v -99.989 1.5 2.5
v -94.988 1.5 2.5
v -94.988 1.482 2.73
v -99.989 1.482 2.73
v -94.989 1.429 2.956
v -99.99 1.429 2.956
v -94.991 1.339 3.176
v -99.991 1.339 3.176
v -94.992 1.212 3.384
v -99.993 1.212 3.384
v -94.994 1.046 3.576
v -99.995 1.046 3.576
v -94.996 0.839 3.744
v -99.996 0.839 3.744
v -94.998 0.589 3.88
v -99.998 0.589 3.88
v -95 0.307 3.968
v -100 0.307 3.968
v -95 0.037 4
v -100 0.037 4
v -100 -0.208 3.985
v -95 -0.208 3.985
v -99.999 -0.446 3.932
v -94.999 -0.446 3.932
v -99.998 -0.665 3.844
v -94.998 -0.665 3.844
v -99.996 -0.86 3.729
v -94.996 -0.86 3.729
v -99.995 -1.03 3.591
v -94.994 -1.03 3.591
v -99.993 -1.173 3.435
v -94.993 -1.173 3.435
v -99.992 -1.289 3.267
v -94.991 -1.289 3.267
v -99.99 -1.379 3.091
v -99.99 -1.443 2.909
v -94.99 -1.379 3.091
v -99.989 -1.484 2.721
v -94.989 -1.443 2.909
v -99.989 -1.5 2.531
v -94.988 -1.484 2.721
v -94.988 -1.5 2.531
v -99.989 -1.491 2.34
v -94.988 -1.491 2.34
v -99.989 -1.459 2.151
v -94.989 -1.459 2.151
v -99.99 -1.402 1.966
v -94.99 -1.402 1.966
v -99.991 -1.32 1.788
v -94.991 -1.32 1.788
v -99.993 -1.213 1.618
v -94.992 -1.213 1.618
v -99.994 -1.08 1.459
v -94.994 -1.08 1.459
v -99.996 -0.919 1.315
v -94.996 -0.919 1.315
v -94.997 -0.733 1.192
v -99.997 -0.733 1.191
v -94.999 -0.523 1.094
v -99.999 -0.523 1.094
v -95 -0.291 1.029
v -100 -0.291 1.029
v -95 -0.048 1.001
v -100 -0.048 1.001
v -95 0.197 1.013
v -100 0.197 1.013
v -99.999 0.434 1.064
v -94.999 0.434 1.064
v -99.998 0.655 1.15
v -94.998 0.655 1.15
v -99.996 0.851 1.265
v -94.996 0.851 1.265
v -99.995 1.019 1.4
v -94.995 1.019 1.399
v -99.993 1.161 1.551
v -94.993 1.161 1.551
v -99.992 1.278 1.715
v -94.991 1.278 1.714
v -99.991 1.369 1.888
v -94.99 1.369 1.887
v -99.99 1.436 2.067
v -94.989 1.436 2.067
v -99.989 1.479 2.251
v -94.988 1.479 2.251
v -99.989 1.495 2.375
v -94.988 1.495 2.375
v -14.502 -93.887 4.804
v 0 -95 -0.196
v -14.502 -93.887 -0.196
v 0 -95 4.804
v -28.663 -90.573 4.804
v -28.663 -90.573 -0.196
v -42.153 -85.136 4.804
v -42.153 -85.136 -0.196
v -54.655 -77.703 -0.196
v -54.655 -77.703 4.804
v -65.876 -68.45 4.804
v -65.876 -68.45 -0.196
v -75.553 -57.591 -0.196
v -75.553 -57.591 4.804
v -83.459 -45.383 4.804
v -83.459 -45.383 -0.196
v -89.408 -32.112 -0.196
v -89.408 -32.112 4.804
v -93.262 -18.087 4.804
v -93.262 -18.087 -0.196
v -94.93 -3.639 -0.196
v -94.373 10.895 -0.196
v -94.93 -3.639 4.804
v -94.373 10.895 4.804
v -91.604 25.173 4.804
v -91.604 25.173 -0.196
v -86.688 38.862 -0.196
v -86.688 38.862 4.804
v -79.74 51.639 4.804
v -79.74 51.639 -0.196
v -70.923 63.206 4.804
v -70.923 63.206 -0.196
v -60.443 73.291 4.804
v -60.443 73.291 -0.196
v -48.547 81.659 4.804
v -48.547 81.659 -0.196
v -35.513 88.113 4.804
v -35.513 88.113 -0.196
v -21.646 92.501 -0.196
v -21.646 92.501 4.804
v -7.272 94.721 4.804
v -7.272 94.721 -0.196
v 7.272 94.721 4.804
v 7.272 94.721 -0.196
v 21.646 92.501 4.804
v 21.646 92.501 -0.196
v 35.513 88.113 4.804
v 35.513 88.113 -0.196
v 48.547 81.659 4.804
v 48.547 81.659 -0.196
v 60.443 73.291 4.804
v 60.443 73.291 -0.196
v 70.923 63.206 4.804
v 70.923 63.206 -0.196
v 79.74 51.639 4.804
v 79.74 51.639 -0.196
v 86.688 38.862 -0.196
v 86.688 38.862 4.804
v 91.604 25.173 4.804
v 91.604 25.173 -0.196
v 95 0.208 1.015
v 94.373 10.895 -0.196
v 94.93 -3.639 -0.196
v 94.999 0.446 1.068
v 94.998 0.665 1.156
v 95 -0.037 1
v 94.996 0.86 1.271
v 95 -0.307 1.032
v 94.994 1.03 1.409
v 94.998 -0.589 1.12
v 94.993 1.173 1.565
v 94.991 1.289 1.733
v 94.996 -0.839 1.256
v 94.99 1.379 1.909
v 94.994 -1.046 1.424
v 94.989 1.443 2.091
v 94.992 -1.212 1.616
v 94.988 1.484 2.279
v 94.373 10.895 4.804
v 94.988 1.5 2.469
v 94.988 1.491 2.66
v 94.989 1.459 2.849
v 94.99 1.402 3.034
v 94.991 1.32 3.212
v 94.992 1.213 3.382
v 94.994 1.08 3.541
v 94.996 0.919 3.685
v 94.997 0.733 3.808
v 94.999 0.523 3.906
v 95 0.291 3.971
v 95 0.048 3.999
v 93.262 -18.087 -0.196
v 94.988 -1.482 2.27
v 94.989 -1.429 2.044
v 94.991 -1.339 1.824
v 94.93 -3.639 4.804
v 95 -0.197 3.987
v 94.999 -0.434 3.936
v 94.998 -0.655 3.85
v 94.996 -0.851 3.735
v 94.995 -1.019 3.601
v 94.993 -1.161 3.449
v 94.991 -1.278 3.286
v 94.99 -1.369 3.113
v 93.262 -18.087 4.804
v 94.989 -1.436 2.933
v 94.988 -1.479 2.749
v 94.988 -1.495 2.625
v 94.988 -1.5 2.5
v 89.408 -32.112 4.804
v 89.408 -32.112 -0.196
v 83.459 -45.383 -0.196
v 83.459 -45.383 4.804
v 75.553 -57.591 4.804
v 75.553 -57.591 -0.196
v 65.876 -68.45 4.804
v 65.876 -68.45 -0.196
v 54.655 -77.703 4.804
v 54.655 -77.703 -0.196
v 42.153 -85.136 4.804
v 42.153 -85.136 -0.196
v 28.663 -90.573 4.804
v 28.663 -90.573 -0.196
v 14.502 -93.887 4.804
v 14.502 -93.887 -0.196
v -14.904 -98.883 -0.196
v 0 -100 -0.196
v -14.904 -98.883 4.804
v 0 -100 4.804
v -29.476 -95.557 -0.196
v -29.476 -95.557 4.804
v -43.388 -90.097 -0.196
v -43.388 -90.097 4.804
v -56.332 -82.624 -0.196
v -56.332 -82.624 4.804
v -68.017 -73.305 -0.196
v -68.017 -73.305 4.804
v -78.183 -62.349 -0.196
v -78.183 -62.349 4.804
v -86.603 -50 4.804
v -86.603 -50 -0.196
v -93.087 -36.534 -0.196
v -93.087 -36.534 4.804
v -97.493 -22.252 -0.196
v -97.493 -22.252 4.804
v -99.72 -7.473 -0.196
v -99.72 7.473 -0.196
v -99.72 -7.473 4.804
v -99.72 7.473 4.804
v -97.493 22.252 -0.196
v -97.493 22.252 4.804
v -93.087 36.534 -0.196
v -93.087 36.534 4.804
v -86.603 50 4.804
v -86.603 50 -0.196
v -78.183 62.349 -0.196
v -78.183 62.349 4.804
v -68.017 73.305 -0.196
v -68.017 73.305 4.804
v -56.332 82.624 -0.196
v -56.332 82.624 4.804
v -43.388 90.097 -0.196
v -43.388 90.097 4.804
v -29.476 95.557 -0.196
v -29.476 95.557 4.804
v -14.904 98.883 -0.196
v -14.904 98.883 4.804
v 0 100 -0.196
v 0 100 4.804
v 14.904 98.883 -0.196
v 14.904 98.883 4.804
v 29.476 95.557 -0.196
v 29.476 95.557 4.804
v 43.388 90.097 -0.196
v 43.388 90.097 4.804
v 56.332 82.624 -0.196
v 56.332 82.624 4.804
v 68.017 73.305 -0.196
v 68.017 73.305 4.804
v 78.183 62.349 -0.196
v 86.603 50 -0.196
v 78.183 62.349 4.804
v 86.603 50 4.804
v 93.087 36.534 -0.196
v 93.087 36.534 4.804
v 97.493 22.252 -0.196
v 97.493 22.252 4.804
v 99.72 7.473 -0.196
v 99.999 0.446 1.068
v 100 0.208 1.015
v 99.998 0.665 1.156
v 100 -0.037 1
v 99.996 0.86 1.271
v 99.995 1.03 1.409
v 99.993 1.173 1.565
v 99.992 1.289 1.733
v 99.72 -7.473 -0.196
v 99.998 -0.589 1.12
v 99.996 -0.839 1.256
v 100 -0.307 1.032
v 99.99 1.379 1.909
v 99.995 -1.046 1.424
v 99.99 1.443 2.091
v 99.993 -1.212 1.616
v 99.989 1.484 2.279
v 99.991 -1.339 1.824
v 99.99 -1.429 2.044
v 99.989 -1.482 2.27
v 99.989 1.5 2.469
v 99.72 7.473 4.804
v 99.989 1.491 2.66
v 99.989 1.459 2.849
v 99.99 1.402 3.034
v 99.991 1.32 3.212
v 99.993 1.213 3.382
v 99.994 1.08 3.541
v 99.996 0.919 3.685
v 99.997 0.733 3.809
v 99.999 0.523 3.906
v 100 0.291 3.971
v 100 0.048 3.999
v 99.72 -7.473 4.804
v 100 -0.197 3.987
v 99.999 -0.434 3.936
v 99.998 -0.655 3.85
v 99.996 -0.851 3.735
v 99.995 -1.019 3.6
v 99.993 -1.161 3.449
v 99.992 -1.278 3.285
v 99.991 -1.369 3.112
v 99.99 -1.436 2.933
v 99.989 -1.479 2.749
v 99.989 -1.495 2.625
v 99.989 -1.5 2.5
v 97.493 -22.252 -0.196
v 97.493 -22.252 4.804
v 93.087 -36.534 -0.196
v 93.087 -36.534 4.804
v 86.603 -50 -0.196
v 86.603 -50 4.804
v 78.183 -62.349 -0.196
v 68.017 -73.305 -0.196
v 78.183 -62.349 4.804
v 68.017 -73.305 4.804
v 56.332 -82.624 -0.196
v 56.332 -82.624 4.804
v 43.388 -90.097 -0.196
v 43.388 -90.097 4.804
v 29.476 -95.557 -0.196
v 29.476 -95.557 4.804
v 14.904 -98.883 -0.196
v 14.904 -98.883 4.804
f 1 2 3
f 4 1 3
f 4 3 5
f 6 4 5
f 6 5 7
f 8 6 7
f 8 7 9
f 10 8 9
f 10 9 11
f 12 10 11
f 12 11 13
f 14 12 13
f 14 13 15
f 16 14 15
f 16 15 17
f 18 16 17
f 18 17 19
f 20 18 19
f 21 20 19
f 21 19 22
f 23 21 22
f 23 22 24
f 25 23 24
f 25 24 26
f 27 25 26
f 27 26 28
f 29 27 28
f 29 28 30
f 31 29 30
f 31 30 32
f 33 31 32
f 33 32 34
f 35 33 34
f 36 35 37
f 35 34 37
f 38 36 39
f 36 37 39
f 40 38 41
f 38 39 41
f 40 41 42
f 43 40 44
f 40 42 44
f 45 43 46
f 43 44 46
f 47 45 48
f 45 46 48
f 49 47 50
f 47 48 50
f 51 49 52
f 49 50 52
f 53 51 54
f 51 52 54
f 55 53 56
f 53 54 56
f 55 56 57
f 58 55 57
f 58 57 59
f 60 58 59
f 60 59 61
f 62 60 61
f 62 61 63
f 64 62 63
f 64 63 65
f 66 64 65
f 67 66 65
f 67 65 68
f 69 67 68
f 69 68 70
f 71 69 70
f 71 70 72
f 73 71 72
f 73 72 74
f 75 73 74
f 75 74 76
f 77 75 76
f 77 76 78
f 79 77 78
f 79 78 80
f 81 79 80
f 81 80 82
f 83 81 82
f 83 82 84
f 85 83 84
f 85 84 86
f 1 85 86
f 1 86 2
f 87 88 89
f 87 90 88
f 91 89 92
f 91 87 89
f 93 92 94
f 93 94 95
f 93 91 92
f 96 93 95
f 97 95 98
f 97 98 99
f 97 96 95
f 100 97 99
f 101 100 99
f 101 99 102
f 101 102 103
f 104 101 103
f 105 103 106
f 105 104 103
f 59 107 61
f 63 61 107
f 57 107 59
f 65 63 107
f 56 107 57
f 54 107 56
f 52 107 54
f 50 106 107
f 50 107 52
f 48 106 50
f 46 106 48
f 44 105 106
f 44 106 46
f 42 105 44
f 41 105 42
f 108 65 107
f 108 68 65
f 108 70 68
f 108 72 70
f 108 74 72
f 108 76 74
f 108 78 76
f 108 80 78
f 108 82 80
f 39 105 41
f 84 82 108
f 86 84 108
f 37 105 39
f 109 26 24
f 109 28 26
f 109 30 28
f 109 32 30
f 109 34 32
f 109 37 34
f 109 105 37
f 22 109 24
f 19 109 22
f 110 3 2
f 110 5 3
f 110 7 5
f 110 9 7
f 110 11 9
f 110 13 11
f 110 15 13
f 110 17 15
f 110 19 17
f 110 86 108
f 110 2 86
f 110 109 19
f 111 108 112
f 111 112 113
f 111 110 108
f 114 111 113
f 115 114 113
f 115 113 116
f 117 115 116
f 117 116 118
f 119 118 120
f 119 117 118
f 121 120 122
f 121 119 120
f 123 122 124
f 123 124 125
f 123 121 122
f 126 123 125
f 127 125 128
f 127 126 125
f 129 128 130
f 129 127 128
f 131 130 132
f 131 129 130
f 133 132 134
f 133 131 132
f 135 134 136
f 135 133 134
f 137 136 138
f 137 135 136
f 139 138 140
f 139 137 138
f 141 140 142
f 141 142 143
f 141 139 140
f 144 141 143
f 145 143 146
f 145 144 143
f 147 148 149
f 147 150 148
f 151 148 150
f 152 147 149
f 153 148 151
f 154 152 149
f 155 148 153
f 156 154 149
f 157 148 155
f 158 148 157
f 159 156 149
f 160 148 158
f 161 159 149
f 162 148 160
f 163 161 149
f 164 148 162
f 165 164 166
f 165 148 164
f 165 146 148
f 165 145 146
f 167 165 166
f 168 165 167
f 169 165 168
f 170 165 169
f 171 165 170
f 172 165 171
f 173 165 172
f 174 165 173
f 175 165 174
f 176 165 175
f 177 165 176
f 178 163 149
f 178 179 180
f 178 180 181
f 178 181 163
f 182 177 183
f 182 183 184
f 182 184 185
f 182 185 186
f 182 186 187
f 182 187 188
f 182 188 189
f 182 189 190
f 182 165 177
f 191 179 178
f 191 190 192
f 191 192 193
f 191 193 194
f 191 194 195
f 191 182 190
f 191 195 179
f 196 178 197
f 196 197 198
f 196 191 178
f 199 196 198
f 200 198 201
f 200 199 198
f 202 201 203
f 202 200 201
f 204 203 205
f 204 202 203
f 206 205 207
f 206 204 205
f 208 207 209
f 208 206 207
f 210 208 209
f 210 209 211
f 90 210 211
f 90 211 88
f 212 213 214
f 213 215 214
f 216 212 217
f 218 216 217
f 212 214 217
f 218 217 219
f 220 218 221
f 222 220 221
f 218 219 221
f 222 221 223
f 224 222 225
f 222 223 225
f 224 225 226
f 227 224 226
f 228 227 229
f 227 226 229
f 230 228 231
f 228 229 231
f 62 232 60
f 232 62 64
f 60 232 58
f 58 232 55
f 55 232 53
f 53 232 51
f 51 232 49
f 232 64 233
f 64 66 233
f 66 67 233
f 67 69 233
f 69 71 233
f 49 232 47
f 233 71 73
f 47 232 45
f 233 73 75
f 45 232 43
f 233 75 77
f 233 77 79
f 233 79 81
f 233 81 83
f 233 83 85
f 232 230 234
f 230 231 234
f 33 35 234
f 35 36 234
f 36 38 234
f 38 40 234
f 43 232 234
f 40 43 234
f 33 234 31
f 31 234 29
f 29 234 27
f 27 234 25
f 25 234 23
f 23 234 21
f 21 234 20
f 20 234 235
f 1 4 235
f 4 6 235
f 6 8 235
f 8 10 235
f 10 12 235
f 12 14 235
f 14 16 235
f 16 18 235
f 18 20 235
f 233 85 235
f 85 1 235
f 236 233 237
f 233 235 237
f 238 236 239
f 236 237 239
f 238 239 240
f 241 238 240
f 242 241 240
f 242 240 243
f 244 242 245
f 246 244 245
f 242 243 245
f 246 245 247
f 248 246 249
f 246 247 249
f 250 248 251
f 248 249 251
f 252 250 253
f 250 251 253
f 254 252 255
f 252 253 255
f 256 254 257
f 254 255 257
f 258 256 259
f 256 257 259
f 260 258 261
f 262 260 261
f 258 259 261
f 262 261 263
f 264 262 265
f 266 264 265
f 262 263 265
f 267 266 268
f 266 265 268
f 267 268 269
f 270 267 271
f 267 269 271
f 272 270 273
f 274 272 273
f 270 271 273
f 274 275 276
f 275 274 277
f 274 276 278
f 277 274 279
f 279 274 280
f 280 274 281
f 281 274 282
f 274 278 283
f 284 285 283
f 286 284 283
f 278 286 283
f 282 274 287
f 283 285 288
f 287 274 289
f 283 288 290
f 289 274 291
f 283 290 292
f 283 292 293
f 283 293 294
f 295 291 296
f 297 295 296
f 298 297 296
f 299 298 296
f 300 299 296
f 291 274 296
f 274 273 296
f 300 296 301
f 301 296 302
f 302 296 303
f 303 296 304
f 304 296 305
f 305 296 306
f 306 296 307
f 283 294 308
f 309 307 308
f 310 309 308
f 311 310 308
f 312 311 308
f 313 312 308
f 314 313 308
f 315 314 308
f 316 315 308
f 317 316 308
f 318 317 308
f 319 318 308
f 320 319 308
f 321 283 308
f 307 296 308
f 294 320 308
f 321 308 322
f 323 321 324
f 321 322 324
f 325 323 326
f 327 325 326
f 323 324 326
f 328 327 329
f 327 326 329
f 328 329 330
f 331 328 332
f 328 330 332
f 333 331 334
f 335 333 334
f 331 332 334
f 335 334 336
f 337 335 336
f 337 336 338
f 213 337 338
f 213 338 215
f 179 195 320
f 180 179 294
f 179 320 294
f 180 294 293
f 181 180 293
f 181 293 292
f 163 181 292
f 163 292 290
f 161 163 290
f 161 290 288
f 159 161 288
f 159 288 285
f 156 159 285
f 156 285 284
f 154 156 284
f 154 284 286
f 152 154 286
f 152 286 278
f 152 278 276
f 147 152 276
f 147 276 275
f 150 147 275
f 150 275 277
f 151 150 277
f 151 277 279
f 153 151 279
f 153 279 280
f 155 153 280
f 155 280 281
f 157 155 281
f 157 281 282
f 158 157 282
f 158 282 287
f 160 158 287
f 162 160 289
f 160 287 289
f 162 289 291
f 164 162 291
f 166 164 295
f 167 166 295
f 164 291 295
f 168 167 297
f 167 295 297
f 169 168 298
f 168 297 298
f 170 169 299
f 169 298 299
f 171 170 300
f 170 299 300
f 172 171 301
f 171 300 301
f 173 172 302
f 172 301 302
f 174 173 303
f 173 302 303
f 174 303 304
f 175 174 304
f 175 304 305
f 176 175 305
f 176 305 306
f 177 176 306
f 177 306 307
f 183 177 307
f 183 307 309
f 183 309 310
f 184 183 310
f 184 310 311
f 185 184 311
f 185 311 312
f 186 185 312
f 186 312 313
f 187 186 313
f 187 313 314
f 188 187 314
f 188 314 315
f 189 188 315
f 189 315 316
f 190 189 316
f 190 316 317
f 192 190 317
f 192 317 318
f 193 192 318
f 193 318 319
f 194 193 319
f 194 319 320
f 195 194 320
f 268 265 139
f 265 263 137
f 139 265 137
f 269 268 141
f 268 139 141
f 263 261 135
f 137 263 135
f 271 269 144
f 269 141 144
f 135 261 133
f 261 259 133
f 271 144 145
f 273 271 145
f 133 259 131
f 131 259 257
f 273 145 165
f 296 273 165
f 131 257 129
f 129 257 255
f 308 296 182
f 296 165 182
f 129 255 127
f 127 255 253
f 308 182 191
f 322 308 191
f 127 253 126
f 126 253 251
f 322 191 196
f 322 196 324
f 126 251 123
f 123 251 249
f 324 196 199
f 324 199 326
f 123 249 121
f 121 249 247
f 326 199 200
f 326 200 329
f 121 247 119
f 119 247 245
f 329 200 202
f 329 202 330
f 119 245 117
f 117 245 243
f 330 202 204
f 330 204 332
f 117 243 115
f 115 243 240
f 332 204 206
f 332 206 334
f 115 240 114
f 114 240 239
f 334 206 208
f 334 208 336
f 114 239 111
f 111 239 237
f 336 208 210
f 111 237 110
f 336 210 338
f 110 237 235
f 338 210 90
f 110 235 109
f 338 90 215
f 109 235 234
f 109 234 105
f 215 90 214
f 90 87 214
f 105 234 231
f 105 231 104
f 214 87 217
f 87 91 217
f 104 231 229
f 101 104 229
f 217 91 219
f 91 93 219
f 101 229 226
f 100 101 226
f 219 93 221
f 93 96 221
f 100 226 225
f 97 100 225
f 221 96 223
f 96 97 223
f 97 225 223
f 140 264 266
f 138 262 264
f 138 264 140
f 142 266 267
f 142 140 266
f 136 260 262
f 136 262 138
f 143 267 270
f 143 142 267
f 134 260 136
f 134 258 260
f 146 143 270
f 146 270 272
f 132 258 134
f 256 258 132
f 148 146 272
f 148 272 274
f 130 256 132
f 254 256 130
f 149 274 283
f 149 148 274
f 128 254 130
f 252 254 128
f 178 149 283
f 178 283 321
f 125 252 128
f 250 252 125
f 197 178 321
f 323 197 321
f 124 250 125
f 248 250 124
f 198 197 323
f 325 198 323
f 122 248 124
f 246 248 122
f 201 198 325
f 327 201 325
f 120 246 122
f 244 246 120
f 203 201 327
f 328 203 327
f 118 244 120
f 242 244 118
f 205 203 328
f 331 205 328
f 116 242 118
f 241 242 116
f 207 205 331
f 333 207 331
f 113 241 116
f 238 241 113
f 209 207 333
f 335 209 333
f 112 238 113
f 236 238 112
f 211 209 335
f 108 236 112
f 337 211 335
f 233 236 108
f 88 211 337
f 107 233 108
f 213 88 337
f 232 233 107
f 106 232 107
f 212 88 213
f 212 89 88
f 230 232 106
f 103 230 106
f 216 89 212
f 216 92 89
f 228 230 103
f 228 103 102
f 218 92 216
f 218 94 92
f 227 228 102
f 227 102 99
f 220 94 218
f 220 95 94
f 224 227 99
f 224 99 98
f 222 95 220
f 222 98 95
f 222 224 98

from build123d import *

# Parameters (mm, degrees)
F0_W     = 5
F0_H     = 5
F2_D     = 3
F2_DEPTH = 100.001
F3_D     = 3


with BuildPart() as f1:
    # F0 (on Right) → F1 (revolve)
    with BuildSketch(Plane.YZ):
        with Locations((-97.5, 2.3040431552)):
            Rectangle(F0_W, F0_H)
    revolve(axis=Axis((0, 0, 1.25), (0, 0, -1)))

    # F2 (through all, one way)
    with BuildSketch(Plane.YZ):
        with Locations((0, 2.5)):
            Circle(F2_D / 2)
    extrude(amount=-F2_DEPTH, mode=Mode.SUBTRACT)

    # F3 (through all)
    with Locations(Plane(origin=(0, 0, 0), x_dir=(0, 1, 0), z_dir=(-1, 0, 0))):
        with Locations((0, -2.5)):
            Hole(F3_D / 2)


solid = f1.part
